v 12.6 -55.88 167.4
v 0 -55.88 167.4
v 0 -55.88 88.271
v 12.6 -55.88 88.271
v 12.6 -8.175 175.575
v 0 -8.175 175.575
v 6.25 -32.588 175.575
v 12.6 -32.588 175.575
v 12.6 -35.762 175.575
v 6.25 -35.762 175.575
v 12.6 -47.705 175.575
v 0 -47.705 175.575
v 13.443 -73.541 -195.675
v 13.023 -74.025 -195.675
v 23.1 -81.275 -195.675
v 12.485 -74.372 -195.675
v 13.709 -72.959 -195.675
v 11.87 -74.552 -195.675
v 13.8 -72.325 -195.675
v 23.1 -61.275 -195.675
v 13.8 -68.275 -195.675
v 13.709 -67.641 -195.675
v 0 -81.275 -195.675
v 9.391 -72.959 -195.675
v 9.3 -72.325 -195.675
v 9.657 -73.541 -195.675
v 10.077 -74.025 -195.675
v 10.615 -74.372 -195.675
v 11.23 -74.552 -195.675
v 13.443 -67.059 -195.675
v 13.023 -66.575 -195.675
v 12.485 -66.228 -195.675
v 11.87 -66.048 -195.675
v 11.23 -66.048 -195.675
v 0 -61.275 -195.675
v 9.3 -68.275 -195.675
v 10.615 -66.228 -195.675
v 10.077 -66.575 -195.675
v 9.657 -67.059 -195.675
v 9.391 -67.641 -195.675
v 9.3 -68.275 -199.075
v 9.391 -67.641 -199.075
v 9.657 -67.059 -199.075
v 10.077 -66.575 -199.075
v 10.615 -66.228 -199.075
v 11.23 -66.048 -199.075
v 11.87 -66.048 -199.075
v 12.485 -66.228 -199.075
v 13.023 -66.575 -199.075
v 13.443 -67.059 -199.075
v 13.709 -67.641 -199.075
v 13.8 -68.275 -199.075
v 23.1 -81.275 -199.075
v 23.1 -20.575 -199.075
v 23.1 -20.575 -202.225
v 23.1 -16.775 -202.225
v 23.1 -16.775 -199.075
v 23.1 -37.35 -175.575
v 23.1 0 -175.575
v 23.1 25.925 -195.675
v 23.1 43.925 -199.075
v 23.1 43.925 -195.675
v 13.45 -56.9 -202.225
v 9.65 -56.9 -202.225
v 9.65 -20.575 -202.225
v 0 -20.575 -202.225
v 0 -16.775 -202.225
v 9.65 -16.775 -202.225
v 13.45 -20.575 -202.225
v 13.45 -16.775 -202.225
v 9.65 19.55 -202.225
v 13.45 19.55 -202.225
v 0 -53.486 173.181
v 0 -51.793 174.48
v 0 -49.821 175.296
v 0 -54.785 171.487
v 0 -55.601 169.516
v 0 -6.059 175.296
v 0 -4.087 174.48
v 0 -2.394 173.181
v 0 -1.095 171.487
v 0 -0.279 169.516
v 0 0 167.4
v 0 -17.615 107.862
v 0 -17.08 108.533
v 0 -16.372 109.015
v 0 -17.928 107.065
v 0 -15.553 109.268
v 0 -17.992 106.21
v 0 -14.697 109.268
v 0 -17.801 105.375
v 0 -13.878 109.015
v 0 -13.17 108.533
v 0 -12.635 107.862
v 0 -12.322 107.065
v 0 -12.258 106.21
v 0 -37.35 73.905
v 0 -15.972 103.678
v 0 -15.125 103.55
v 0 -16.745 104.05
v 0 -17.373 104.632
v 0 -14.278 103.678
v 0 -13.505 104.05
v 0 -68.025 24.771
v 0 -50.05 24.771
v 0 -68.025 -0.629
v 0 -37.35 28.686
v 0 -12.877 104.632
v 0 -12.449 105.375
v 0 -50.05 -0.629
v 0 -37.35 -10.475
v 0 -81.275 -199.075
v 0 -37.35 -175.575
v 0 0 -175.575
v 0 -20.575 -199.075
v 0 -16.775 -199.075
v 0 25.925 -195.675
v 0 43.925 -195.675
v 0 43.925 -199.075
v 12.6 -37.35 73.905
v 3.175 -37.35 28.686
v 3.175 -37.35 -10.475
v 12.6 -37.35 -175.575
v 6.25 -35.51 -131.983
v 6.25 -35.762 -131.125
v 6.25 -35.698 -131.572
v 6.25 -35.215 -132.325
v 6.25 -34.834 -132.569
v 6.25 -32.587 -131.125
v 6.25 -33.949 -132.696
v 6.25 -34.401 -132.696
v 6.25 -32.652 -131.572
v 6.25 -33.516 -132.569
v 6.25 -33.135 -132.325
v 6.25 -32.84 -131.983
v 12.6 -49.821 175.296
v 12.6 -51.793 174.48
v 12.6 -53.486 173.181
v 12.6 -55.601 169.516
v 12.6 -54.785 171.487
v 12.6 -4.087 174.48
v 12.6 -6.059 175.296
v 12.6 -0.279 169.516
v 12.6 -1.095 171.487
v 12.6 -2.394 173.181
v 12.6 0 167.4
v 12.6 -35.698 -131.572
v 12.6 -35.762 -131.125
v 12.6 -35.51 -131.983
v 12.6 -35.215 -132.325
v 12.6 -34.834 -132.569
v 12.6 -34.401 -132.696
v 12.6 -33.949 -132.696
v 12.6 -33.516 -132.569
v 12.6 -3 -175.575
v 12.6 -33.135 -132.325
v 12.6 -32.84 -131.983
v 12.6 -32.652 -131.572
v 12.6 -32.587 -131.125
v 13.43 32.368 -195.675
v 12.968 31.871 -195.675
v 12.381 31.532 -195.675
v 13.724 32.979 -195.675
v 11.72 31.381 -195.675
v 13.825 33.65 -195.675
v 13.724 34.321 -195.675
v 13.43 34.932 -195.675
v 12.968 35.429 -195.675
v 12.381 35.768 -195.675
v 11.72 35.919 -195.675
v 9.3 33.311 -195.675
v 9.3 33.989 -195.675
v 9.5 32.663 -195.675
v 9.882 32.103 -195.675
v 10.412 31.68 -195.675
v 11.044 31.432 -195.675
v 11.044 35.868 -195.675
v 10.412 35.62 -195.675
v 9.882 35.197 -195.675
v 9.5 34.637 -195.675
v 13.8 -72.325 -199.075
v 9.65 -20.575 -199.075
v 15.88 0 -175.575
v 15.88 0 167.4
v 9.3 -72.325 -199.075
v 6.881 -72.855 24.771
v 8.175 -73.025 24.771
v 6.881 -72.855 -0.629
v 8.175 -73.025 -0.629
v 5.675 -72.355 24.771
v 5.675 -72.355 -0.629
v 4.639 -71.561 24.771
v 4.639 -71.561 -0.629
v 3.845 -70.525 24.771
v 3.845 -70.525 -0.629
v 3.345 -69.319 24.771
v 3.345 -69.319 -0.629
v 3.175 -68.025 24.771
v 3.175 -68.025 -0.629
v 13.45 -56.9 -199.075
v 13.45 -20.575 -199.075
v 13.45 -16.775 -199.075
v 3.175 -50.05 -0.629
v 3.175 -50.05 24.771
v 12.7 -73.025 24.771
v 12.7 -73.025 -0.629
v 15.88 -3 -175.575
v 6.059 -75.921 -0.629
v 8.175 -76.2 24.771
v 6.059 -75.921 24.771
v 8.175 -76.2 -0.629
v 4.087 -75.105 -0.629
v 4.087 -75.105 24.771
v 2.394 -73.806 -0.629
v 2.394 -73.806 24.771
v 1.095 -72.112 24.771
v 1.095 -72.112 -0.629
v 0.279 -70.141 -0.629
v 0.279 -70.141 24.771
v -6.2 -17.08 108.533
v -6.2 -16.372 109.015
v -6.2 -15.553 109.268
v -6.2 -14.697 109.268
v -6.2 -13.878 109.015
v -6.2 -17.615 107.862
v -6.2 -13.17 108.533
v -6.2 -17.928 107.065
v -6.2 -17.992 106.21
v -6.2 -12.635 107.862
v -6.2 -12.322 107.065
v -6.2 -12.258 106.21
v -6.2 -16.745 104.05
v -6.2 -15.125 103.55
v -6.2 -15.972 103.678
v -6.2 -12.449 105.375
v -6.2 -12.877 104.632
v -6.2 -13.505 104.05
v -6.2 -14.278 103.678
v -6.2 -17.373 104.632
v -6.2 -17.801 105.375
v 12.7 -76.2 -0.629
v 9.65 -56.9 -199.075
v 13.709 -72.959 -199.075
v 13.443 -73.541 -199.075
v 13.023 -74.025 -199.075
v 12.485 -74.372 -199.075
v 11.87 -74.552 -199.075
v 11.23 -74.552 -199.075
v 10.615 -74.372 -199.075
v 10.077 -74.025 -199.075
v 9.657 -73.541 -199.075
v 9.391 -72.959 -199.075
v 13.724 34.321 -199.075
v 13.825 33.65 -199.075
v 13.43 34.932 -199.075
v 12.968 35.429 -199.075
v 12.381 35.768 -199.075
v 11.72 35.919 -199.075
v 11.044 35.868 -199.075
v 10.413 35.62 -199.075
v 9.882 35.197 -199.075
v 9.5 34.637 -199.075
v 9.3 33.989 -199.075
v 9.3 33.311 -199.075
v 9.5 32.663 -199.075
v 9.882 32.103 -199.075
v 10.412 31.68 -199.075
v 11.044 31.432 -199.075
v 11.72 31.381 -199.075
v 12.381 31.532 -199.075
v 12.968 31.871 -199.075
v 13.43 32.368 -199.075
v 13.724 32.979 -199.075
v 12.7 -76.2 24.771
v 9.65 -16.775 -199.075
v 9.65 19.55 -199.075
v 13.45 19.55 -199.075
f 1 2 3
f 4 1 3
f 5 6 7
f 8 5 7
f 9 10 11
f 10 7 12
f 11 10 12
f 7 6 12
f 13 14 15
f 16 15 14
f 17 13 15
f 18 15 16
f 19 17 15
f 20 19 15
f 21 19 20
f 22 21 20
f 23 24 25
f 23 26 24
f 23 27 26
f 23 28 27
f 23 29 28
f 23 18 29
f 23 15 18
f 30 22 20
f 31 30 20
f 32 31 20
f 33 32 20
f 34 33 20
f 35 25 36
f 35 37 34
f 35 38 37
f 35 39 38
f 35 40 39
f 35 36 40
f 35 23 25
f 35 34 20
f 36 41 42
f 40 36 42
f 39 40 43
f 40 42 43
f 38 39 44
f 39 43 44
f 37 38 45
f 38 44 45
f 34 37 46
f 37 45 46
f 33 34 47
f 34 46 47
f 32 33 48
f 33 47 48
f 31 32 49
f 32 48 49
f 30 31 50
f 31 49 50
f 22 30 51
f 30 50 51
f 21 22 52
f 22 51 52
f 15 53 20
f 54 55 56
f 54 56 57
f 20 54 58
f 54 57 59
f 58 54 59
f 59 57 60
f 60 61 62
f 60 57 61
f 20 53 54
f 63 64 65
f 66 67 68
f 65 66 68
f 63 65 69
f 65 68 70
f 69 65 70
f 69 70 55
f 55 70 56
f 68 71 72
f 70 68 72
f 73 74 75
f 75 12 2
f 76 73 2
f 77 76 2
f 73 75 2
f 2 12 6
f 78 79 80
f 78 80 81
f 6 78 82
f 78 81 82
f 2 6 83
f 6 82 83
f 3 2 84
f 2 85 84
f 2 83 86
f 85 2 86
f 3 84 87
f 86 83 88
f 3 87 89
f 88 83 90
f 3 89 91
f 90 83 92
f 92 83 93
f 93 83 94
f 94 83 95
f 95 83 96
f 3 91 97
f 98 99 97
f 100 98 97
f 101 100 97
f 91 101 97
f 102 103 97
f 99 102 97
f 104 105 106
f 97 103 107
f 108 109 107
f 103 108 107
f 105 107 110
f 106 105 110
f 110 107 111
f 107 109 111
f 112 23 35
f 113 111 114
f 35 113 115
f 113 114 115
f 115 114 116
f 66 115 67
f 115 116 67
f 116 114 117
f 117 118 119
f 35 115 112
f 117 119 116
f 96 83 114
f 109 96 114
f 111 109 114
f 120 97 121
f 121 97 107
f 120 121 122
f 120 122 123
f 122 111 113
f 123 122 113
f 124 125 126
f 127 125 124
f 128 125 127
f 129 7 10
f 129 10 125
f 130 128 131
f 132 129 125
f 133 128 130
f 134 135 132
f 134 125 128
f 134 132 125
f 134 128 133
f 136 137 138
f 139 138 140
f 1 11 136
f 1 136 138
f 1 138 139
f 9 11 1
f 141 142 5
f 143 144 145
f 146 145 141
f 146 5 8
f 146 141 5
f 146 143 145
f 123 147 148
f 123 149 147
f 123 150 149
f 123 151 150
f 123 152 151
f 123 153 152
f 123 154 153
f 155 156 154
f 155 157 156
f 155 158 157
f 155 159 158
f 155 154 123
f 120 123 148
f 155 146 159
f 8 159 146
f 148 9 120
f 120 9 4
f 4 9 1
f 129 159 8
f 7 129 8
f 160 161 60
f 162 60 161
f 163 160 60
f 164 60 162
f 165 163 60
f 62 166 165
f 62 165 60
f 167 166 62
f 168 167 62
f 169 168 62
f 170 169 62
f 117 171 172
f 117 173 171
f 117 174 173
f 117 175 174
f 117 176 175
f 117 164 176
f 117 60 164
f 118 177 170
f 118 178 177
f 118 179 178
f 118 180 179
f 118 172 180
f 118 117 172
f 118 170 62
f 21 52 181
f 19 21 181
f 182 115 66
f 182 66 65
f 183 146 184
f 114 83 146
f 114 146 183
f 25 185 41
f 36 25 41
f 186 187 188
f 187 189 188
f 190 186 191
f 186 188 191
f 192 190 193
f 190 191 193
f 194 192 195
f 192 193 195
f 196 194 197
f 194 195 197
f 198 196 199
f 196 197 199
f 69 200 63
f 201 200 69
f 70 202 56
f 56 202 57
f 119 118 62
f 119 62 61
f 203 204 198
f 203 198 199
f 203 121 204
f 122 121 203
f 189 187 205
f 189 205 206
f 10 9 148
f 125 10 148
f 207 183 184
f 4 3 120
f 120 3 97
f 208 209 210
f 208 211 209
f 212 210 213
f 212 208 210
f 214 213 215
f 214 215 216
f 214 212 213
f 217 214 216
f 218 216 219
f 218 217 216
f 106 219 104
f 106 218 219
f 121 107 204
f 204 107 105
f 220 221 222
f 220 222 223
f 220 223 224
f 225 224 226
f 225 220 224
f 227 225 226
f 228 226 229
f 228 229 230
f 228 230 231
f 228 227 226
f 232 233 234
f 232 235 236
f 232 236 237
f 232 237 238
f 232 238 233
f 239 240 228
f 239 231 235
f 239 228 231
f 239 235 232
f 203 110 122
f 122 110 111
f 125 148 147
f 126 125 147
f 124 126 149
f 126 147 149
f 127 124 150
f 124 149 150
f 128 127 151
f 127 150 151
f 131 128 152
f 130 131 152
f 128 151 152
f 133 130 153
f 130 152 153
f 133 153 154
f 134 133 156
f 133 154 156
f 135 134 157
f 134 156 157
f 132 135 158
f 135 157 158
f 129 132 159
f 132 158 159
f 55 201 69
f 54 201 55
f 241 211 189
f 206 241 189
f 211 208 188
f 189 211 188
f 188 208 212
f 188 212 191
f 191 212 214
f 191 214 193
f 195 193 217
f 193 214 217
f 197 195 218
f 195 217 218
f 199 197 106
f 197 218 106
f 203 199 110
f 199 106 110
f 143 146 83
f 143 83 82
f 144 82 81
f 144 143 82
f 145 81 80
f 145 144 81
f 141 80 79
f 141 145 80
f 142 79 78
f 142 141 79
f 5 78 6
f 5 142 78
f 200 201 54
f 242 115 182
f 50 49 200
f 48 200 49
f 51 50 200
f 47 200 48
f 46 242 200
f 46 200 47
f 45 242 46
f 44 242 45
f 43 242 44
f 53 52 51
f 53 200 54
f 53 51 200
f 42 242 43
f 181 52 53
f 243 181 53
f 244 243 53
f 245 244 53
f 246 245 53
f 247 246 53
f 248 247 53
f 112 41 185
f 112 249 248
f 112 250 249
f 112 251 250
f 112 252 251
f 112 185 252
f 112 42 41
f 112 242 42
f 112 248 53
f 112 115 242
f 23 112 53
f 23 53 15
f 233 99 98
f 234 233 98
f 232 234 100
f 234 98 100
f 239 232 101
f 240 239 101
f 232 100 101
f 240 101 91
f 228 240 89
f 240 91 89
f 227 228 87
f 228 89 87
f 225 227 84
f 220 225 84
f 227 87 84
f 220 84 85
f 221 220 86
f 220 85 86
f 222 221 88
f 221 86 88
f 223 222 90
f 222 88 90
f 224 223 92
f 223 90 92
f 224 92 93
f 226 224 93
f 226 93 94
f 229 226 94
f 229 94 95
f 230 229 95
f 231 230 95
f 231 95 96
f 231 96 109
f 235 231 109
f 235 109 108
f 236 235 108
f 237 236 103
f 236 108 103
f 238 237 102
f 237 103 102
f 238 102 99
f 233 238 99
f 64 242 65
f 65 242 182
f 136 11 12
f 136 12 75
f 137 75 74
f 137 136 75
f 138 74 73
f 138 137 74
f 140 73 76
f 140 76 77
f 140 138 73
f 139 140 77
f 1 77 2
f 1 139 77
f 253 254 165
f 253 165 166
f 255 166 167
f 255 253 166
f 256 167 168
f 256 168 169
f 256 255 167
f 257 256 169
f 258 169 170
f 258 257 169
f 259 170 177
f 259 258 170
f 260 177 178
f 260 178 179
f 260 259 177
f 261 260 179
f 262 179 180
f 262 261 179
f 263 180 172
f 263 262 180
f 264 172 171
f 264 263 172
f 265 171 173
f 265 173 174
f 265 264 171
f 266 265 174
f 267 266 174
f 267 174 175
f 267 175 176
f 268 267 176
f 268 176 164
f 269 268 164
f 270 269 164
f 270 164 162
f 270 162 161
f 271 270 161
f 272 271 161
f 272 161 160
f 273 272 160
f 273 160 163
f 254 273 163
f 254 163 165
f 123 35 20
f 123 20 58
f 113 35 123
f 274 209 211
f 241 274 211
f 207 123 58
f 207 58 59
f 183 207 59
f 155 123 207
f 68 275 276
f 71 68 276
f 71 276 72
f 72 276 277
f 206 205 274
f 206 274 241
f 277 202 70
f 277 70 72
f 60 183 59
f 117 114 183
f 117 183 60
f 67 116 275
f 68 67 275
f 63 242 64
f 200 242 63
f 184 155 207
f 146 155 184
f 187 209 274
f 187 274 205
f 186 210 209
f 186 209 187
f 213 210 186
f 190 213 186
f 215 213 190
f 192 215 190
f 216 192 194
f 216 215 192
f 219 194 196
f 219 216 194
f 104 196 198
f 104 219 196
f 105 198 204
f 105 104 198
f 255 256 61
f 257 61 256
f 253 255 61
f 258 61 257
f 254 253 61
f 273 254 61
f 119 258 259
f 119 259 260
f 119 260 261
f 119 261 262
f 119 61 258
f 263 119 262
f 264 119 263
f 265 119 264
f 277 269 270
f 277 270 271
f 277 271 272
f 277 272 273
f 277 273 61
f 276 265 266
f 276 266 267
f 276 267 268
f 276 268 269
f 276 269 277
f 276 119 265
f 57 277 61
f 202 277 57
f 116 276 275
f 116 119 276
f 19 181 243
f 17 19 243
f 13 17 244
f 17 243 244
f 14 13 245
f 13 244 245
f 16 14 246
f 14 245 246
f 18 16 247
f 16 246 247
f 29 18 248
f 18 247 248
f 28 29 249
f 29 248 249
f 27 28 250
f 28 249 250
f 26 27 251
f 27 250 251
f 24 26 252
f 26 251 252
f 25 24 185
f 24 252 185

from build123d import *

# Parameters (mm, degrees)
BOSS_EXTRUDE1_DEPTH  = 12.6
BOSS_EXTRUDE2_DEPTH  = 23.1
BOSS_EXTRUDE3_DEPTH  = 3.175
SKETCH1_5_W          = 25.4
SKETCH1_5_H          = 3.175
BOSS_EXTRUDE4_DEPTH  = 12.7
FILLET1_R            = 5
FILLET2_R            = 8.175
CUT_EXTRUDE1_DEPTH   = 6.35
CUT_EXTRUDE2_REACH   = 386.06
SKETCH3_R            = 2.275
SKETCH4_W            = 23.1
SKETCH4_H            = 3.8
SKETCH4_W_2          = 3.8
SKETCH4_H_2          = 76.45
EXTRUDE_THIN1_DEPTH  = 3.15
SKETCH5_R            = 2.875
BOSS_EXTRUDE5_DEPTH  = 6.2
BOSS_EXTRUDE5_TAPER  = 2
FILLET1_OF_MIRROR1_R = 5
FILLET2_OF_MIRROR1_R = 8.175
SKETCH6_R            = 2.875
BOSS_EXTRUDE6_DEPTH  = 6.2
BOSS_EXTRUDE7_DEPTH  = 3.28


with BuildPart() as part:
    # Sketch1 → Boss-Extrude1 (new body)
    with BuildSketch(Plane(origin=(0, 0, 0), x_dir=(0, 0, -1), z_dir=(1, 0, 0))):
        Polygon((175.575, -37.35), (175.575, 0), (-175.575, 0), (-175.575, -55.88), (-88.271480231, -55.88), (-73.904922854, -37.35), (-28.686383268, -37.35), (10.475, -37.35), align=None)
    boss_extrude1 = extrude(amount=-BOSS_EXTRUDE1_DEPTH)

    # Sketch1<3> → Boss-Extrude2 (add)
    with BuildSketch(Plane(origin=(0, 0, 0), x_dir=(0, 0, -1), z_dir=(1, 0, 0))):
        Polygon((175.575, 0), (195.675, 25.925), (195.675, 43.925), (199.075, 43.925), (199.075, -81.275), (195.675, -81.275), (195.675, -61.275), (175.575, -37.35), align=None)
    boss_extrude2 = extrude(amount=-BOSS_EXTRUDE2_DEPTH)

    # Sketch1<4> → Boss-Extrude3 (add)
    with BuildSketch(Plane(origin=(0, 0, 0), x_dir=(0, 0, -1), z_dir=(1, 0, 0))):
        Polygon((0.628519769, -50.05), (10.475, -37.35), (-28.686383268, -37.35), (-24.771480231, -50.05), (-24.771480231, -73.025), (0.628519769, -73.025), align=None)
    boss_extrude3 = extrude(amount=-BOSS_EXTRUDE3_DEPTH)

    # Sketch1<5> → Boss-Extrude4 (add)
    with BuildSketch(Plane(origin=(0, 0, 0), x_dir=(0, 0, -1), z_dir=(1, 0, 0))):
        with Locations((-12.071480231, -74.6125)):
            Rectangle(SKETCH1_5_W, SKETCH1_5_H)
    boss_extrude4 = extrude(amount=-BOSS_EXTRUDE4_DEPTH)

    # Fillet1
    fillet1_edges = [part.edges().sort_by_distance(p)[0] for p in [
        (-3.175, -73.025, 12.071480231),
    ]]
    fillet(fillet1_edges, radius=FILLET1_R)

    # Fillet2
    fillet2_edges = [part.edges().sort_by_distance(p)[0] for p in [
        (-6.3, -55.88, 175.575),
        (-6.3, 0, 175.575),
        (0, -76.2, 12.071480231),
    ]]
    fillet(fillet2_edges, radius=FILLET2_R)

    # Sketch2 → Cut-Extrude1 (cut)
    with BuildSketch(Plane.ZY.offset(12.6)):
        with BuildLine():
            Line((-131.125, -32.5875), (222.402046917, -32.5875))
            ThreePointArc((222.402046917, -32.5875), (223.989546917, -34.175), (222.402046917, -35.7625))
            Line((222.402046917, -35.7625), (-131.125, -35.7625))
            ThreePointArc((-131.125, -35.7625), (-132.7125, -34.175), (-131.125, -32.5875))
        make_face()
    cut_extrude1 = extrude(amount=-CUT_EXTRUDE1_DEPTH, mode=Mode.SUBTRACT)

    # Sketch3 → Cut-Extrude2 (cut, up to next)
    with BuildSketch(Plane(origin=(0, 0, -199.075), x_dir=(-1, 0, 0), z_dir=(0, 0, -1)), mode=Mode.PRIVATE) as cut_extrude2_sk1:
        with Locations((11.55, 33.65)):
            Circle(SKETCH3_R)
    cut_extrude2_tool1 = extrude(cut_extrude2_sk1.sketch, amount=-CUT_EXTRUDE2_REACH, mode=Mode.PRIVATE) & part.part
    # Sketch3 → Cut-Extrude2 (cut, up to next)
    with BuildSketch(Plane(origin=(0, 0, -199.075), x_dir=(-1, 0, 0), z_dir=(0, 0, -1)), mode=Mode.PRIVATE) as cut_extrude2_sk2:
        with BuildLine():
            Line((9.3, -72.325), (9.3, -68.275))
            ThreePointArc((9.3, -68.275), (11.55, -66.025), (13.8, -68.275))
            Line((13.8, -68.275), (13.8, -72.325))
            ThreePointArc((13.8, -72.325), (11.55, -74.575), (9.3, -72.325))
        make_face()
    cut_extrude2_tool2 = extrude(cut_extrude2_sk2.sketch, amount=-CUT_EXTRUDE2_REACH, mode=Mode.PRIVATE) & part.part
    cut_extrude2_1 = cut_extrude2_tool1.solids().sort_by_distance((-11.55, 33.65, -199.075))[0]
    add(cut_extrude2_1, mode=Mode.SUBTRACT)
    cut_extrude2_2 = cut_extrude2_tool2.solids().sort_by_distance((-11.55, -70.3, -199.075))[0]
    add(cut_extrude2_2, mode=Mode.SUBTRACT)
    cut_extrude2 = cut_extrude2_1 + cut_extrude2_2  # Cut-Extrude2 as one shape, for the pattern or mirror that repeats it

    # Sketch4 → Extrude-Thin1 (add)
    with BuildSketch(Plane(origin=(0, 0, -199.075), x_dir=(-1, 0, 0), z_dir=(0, 0, -1))):
        with Locations((11.55, -18.675)):
            Rectangle(SKETCH4_W, SKETCH4_H)
        with Locations((11.55, -18.675)):
            Rectangle(SKETCH4_W_2, SKETCH4_H_2)
    extrude_thin1 = extrude(amount=EXTRUDE_THIN1_DEPTH)

    # Sketch5 → Boss-Extrude5 (add)
    with BuildSketch(Plane(origin=(0, 0, 0), x_dir=(0, 0, -1), z_dir=(1, 0, 0))):
        with Locations((-106.425, -48.98)):
            Circle(SKETCH5_R)
    extrude(amount=BOSS_EXTRUDE5_DEPTH, taper=BOSS_EXTRUDE5_TAPER)


with BuildPart() as mirror1_1:
    # Mirror1: Boss-Extrude1, Boss-Extrude2, Boss-Extrude3, Boss-Extrude4 across plane
    add(boss_extrude1.mirror(Plane(origin=(0, 0, 0), x_dir=(0, 0, 1), z_dir=(1, 0, 0))))
    add(boss_extrude2.mirror(Plane(origin=(0, 0, 0), x_dir=(0, 0, 1), z_dir=(1, 0, 0))))
    add(boss_extrude3.mirror(Plane(origin=(0, 0, 0), x_dir=(0, 0, 1), z_dir=(1, 0, 0))))
    add(boss_extrude4.mirror(Plane(origin=(0, 0, 0), x_dir=(0, 0, 1), z_dir=(1, 0, 0))))

    # Mirror1 2: Cut-Extrude1, Cut-Extrude2 across plane
    add(cut_extrude1.mirror(Plane(origin=(0, 0, 0), x_dir=(0, 0, 1), z_dir=(1, 0, 0))), mode=Mode.SUBTRACT)
    add(cut_extrude2.mirror(Plane(origin=(0, 0, 0), x_dir=(0, 0, 1), z_dir=(1, 0, 0))), mode=Mode.SUBTRACT)

    # Fillet1 of Mirror1
    fillet1_of_mirror1_edges = [mirror1_1.edges().sort_by_distance(p)[0] for p in [
        (3.175, -73.025, 12.071480231),
    ]]
    fillet(fillet1_of_mirror1_edges, radius=FILLET1_OF_MIRROR1_R)

    # Fillet2 of Mirror1
    fillet2_of_mirror1_edges = [mirror1_1.edges().sort_by_distance(p)[0] for p in [
        (6.3, -55.88, 175.575),
        (6.3, 0, 175.575),
        (0, -76.2, 12.071480231),
    ]]
    fillet(fillet2_of_mirror1_edges, radius=FILLET2_OF_MIRROR1_R)


with BuildPart() as mirror1_3_1:
    # Mirror1 3: Extrude-Thin1 across plane
    add(extrude_thin1.mirror(Plane(origin=(0, 0, 0), x_dir=(0, 0, 1), z_dir=(1, 0, 0))))


with BuildPart() as part_1:
    add(part.part)

    # Mirror1 united with what the copies touc: union Mirror1_1, Mirror1 3_1
    add(mirror1_1.part)
    add(mirror1_3_1.part)

    # SurfaceCut1
    split(bisect_by=Plane(origin=(0, 0, 0), x_dir=(0, 0, -1), z_dir=(1, 0, 0)), keep=Keep.TOP)

    # Sketch6 → Boss-Extrude6 (add)
    with BuildSketch(Plane.ZY):
        with Locations(Location((106.425, -15.125, 0), (0, 0, 180))):
            Circle(SKETCH6_R)
    extrude(amount=BOSS_EXTRUDE6_DEPTH)

    # Sketch7 → Boss-Extrude7 (add)
    with BuildSketch(Plane(origin=(12.6, 0, 0), x_dir=(0, 0, -1), z_dir=(1, 0, 0))):
        Polygon((175.575, 0), (175.575, -3), (-167.4, 0), align=None)
    extrude(amount=BOSS_EXTRUDE7_DEPTH)


solid = part_1.part
